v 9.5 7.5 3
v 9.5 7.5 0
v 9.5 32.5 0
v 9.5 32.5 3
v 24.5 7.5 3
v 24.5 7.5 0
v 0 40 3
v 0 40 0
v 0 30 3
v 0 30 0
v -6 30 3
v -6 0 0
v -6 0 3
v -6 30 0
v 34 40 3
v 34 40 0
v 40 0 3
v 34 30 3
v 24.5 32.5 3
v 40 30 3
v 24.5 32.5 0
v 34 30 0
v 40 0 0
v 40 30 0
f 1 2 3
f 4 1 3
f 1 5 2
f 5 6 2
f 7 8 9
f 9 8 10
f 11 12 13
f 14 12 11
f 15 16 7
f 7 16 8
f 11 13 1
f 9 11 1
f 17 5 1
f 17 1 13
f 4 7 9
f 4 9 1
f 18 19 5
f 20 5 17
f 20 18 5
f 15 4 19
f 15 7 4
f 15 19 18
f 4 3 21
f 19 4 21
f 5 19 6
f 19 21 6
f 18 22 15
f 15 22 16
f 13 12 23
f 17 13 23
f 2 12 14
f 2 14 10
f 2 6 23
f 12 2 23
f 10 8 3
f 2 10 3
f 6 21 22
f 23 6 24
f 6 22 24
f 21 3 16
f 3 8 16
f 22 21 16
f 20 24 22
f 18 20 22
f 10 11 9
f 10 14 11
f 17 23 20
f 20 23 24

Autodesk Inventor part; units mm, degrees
ref_plane "YZ Plane" through (0, 0, 0) normal (1, 0, 0) x (0, 1, 0)
ref_plane "XZ Plane" through (0, 0, 0) normal (0, 1, 0) x (-1, 0, 0)
ref_plane "XY Plane" through (0, 0, 0) normal (0, 0, 1) x (1, 0, 0)
sketch "Sketch1" plane through (0, 0, 0) normal (0, 0, 1) x (1, 0, 0)
  line L0 (0, 0) -> (34, 0)
  line L1 (34, 0) -> (34, 40)
  line L2 (34, 40) -> (0, 40)
  line L3 (0, 40) -> (0, 0)
  line L4 (-6, 30) -> (0, 30)
  line L5 (0, 30) -> (0, 0)
  line L6 (0, 0) -> (-6, 0)
  line L7 (-6, 0) -> (-6, 30)
  line L8 (-6, 30) -> (0, 0) construction
  line L9 (0, 30) -> (-6, 0) construction
  line L10 (40, 30) -> (34, 30)
  line L11 (34, 30) -> (34, 0)
  line L12 (34, 0) -> (40, 0)
  line L13 (40, 0) -> (40, 30)
  line L14 (40, 30) -> (34, 0) construction
  line L15 (34, 30) -> (40, 0) construction
  line L16 (9.5, 32.5) -> (24.5, 32.5)
  line L17 (24.5, 32.5) -> (24.5, 7.5)
  line L18 (24.5, 7.5) -> (9.5, 7.5)
  line L19 (9.5, 7.5) -> (9.5, 32.5)
  line L20 (9.5, 32.5) -> (24.5, 7.5) construction
  line L21 (24.5, 32.5) -> (9.5, 7.5) construction
  point P0 (-3, 15)
  point P1 (37, 15)
  point P2 (0, 20)
  point P3 (0, 15)
  point P4 (34, 30)
  point P5 (0, 30)
  point P6 (17, 20)
  point P7 (17, 40)
  point P8 (34, 20)
  dimension "d0" = 34
  dimension "d1" = 40
  dimension "d2" = 6
  dimension "d3" = 6
  dimension "d4" = 30
  dimension "d5" = 30
  dimension "d8" = 15
  dimension "d9" = 25
extrude "Extrusion1" add sketch "Sketch1" along normal blind 3
properties part number "Frontrail"
